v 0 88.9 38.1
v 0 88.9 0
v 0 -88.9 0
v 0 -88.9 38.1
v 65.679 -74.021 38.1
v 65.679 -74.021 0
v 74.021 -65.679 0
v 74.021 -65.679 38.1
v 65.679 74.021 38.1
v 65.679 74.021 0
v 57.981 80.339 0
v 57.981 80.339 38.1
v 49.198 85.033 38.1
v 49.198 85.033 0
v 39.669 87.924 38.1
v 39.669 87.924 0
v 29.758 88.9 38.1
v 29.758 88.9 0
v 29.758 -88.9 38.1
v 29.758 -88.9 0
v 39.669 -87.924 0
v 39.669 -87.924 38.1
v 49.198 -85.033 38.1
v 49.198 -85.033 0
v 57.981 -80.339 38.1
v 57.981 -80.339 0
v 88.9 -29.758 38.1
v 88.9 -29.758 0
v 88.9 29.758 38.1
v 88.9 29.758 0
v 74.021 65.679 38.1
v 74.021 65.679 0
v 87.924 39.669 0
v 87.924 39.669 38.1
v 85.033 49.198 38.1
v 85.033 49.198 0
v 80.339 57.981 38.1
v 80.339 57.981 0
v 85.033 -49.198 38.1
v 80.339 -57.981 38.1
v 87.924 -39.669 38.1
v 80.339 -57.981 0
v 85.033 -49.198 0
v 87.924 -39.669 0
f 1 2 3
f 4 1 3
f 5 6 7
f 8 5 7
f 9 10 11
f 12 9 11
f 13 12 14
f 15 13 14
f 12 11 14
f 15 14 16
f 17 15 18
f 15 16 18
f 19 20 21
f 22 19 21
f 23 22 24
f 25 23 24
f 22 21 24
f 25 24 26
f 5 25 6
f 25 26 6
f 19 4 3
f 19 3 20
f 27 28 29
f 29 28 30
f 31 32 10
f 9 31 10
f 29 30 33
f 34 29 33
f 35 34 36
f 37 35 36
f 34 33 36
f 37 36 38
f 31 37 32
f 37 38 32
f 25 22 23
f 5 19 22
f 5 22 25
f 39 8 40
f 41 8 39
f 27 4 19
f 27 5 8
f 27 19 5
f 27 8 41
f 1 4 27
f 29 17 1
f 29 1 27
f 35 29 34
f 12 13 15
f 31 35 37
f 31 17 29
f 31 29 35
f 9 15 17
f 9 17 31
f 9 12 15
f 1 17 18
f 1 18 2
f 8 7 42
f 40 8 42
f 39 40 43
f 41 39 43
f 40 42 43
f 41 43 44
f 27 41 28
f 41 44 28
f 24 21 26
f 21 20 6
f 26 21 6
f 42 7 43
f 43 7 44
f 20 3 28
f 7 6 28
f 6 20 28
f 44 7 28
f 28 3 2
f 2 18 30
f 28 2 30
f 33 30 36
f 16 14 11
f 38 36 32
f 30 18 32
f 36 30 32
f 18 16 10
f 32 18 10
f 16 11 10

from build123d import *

# Parameters (mm, degrees)
F1_DEPTH = 38.1


with BuildPart() as f1:
    # F0 (on Top) → F1 (new body)
    with BuildSketch(Plane.XY):
        with BuildLine():
            Line((0, 88.9), (0, 0))
            Line((0, 0), (88.9, 0))
            Line((88.9, 0), (88.9, 29.757951))
            ThreePointArc((88.9, 29.757951), (85.03308, 49.198269), (74.021024, 65.678976))
            Line((74.021024, 65.678976), (65.678976, 74.021024))
            ThreePointArc((65.678976, 74.021024), (49.198269, 85.03308), (29.757951, 88.9))
            Line((29.757951, 88.9), (0, 88.9))
        make_face()
        with BuildLine():
            Line((88.9, 0), (0, 0))
            Line((0, 0), (0, -88.9))
            Line((0, -88.9), (29.757951, -88.9))
            ThreePointArc((29.757951, -88.9), (49.198269, -85.03308), (65.678976, -74.021024))
            Line((65.678976, -74.021024), (74.021024, -65.678976))
            ThreePointArc((74.021024, -65.678976), (85.03308, -49.198269), (88.9, -29.757951))
            Line((88.9, -29.757951), (88.9, 0))
        make_face()
    extrude(amount=F1_DEPTH)


solid = f1.part
